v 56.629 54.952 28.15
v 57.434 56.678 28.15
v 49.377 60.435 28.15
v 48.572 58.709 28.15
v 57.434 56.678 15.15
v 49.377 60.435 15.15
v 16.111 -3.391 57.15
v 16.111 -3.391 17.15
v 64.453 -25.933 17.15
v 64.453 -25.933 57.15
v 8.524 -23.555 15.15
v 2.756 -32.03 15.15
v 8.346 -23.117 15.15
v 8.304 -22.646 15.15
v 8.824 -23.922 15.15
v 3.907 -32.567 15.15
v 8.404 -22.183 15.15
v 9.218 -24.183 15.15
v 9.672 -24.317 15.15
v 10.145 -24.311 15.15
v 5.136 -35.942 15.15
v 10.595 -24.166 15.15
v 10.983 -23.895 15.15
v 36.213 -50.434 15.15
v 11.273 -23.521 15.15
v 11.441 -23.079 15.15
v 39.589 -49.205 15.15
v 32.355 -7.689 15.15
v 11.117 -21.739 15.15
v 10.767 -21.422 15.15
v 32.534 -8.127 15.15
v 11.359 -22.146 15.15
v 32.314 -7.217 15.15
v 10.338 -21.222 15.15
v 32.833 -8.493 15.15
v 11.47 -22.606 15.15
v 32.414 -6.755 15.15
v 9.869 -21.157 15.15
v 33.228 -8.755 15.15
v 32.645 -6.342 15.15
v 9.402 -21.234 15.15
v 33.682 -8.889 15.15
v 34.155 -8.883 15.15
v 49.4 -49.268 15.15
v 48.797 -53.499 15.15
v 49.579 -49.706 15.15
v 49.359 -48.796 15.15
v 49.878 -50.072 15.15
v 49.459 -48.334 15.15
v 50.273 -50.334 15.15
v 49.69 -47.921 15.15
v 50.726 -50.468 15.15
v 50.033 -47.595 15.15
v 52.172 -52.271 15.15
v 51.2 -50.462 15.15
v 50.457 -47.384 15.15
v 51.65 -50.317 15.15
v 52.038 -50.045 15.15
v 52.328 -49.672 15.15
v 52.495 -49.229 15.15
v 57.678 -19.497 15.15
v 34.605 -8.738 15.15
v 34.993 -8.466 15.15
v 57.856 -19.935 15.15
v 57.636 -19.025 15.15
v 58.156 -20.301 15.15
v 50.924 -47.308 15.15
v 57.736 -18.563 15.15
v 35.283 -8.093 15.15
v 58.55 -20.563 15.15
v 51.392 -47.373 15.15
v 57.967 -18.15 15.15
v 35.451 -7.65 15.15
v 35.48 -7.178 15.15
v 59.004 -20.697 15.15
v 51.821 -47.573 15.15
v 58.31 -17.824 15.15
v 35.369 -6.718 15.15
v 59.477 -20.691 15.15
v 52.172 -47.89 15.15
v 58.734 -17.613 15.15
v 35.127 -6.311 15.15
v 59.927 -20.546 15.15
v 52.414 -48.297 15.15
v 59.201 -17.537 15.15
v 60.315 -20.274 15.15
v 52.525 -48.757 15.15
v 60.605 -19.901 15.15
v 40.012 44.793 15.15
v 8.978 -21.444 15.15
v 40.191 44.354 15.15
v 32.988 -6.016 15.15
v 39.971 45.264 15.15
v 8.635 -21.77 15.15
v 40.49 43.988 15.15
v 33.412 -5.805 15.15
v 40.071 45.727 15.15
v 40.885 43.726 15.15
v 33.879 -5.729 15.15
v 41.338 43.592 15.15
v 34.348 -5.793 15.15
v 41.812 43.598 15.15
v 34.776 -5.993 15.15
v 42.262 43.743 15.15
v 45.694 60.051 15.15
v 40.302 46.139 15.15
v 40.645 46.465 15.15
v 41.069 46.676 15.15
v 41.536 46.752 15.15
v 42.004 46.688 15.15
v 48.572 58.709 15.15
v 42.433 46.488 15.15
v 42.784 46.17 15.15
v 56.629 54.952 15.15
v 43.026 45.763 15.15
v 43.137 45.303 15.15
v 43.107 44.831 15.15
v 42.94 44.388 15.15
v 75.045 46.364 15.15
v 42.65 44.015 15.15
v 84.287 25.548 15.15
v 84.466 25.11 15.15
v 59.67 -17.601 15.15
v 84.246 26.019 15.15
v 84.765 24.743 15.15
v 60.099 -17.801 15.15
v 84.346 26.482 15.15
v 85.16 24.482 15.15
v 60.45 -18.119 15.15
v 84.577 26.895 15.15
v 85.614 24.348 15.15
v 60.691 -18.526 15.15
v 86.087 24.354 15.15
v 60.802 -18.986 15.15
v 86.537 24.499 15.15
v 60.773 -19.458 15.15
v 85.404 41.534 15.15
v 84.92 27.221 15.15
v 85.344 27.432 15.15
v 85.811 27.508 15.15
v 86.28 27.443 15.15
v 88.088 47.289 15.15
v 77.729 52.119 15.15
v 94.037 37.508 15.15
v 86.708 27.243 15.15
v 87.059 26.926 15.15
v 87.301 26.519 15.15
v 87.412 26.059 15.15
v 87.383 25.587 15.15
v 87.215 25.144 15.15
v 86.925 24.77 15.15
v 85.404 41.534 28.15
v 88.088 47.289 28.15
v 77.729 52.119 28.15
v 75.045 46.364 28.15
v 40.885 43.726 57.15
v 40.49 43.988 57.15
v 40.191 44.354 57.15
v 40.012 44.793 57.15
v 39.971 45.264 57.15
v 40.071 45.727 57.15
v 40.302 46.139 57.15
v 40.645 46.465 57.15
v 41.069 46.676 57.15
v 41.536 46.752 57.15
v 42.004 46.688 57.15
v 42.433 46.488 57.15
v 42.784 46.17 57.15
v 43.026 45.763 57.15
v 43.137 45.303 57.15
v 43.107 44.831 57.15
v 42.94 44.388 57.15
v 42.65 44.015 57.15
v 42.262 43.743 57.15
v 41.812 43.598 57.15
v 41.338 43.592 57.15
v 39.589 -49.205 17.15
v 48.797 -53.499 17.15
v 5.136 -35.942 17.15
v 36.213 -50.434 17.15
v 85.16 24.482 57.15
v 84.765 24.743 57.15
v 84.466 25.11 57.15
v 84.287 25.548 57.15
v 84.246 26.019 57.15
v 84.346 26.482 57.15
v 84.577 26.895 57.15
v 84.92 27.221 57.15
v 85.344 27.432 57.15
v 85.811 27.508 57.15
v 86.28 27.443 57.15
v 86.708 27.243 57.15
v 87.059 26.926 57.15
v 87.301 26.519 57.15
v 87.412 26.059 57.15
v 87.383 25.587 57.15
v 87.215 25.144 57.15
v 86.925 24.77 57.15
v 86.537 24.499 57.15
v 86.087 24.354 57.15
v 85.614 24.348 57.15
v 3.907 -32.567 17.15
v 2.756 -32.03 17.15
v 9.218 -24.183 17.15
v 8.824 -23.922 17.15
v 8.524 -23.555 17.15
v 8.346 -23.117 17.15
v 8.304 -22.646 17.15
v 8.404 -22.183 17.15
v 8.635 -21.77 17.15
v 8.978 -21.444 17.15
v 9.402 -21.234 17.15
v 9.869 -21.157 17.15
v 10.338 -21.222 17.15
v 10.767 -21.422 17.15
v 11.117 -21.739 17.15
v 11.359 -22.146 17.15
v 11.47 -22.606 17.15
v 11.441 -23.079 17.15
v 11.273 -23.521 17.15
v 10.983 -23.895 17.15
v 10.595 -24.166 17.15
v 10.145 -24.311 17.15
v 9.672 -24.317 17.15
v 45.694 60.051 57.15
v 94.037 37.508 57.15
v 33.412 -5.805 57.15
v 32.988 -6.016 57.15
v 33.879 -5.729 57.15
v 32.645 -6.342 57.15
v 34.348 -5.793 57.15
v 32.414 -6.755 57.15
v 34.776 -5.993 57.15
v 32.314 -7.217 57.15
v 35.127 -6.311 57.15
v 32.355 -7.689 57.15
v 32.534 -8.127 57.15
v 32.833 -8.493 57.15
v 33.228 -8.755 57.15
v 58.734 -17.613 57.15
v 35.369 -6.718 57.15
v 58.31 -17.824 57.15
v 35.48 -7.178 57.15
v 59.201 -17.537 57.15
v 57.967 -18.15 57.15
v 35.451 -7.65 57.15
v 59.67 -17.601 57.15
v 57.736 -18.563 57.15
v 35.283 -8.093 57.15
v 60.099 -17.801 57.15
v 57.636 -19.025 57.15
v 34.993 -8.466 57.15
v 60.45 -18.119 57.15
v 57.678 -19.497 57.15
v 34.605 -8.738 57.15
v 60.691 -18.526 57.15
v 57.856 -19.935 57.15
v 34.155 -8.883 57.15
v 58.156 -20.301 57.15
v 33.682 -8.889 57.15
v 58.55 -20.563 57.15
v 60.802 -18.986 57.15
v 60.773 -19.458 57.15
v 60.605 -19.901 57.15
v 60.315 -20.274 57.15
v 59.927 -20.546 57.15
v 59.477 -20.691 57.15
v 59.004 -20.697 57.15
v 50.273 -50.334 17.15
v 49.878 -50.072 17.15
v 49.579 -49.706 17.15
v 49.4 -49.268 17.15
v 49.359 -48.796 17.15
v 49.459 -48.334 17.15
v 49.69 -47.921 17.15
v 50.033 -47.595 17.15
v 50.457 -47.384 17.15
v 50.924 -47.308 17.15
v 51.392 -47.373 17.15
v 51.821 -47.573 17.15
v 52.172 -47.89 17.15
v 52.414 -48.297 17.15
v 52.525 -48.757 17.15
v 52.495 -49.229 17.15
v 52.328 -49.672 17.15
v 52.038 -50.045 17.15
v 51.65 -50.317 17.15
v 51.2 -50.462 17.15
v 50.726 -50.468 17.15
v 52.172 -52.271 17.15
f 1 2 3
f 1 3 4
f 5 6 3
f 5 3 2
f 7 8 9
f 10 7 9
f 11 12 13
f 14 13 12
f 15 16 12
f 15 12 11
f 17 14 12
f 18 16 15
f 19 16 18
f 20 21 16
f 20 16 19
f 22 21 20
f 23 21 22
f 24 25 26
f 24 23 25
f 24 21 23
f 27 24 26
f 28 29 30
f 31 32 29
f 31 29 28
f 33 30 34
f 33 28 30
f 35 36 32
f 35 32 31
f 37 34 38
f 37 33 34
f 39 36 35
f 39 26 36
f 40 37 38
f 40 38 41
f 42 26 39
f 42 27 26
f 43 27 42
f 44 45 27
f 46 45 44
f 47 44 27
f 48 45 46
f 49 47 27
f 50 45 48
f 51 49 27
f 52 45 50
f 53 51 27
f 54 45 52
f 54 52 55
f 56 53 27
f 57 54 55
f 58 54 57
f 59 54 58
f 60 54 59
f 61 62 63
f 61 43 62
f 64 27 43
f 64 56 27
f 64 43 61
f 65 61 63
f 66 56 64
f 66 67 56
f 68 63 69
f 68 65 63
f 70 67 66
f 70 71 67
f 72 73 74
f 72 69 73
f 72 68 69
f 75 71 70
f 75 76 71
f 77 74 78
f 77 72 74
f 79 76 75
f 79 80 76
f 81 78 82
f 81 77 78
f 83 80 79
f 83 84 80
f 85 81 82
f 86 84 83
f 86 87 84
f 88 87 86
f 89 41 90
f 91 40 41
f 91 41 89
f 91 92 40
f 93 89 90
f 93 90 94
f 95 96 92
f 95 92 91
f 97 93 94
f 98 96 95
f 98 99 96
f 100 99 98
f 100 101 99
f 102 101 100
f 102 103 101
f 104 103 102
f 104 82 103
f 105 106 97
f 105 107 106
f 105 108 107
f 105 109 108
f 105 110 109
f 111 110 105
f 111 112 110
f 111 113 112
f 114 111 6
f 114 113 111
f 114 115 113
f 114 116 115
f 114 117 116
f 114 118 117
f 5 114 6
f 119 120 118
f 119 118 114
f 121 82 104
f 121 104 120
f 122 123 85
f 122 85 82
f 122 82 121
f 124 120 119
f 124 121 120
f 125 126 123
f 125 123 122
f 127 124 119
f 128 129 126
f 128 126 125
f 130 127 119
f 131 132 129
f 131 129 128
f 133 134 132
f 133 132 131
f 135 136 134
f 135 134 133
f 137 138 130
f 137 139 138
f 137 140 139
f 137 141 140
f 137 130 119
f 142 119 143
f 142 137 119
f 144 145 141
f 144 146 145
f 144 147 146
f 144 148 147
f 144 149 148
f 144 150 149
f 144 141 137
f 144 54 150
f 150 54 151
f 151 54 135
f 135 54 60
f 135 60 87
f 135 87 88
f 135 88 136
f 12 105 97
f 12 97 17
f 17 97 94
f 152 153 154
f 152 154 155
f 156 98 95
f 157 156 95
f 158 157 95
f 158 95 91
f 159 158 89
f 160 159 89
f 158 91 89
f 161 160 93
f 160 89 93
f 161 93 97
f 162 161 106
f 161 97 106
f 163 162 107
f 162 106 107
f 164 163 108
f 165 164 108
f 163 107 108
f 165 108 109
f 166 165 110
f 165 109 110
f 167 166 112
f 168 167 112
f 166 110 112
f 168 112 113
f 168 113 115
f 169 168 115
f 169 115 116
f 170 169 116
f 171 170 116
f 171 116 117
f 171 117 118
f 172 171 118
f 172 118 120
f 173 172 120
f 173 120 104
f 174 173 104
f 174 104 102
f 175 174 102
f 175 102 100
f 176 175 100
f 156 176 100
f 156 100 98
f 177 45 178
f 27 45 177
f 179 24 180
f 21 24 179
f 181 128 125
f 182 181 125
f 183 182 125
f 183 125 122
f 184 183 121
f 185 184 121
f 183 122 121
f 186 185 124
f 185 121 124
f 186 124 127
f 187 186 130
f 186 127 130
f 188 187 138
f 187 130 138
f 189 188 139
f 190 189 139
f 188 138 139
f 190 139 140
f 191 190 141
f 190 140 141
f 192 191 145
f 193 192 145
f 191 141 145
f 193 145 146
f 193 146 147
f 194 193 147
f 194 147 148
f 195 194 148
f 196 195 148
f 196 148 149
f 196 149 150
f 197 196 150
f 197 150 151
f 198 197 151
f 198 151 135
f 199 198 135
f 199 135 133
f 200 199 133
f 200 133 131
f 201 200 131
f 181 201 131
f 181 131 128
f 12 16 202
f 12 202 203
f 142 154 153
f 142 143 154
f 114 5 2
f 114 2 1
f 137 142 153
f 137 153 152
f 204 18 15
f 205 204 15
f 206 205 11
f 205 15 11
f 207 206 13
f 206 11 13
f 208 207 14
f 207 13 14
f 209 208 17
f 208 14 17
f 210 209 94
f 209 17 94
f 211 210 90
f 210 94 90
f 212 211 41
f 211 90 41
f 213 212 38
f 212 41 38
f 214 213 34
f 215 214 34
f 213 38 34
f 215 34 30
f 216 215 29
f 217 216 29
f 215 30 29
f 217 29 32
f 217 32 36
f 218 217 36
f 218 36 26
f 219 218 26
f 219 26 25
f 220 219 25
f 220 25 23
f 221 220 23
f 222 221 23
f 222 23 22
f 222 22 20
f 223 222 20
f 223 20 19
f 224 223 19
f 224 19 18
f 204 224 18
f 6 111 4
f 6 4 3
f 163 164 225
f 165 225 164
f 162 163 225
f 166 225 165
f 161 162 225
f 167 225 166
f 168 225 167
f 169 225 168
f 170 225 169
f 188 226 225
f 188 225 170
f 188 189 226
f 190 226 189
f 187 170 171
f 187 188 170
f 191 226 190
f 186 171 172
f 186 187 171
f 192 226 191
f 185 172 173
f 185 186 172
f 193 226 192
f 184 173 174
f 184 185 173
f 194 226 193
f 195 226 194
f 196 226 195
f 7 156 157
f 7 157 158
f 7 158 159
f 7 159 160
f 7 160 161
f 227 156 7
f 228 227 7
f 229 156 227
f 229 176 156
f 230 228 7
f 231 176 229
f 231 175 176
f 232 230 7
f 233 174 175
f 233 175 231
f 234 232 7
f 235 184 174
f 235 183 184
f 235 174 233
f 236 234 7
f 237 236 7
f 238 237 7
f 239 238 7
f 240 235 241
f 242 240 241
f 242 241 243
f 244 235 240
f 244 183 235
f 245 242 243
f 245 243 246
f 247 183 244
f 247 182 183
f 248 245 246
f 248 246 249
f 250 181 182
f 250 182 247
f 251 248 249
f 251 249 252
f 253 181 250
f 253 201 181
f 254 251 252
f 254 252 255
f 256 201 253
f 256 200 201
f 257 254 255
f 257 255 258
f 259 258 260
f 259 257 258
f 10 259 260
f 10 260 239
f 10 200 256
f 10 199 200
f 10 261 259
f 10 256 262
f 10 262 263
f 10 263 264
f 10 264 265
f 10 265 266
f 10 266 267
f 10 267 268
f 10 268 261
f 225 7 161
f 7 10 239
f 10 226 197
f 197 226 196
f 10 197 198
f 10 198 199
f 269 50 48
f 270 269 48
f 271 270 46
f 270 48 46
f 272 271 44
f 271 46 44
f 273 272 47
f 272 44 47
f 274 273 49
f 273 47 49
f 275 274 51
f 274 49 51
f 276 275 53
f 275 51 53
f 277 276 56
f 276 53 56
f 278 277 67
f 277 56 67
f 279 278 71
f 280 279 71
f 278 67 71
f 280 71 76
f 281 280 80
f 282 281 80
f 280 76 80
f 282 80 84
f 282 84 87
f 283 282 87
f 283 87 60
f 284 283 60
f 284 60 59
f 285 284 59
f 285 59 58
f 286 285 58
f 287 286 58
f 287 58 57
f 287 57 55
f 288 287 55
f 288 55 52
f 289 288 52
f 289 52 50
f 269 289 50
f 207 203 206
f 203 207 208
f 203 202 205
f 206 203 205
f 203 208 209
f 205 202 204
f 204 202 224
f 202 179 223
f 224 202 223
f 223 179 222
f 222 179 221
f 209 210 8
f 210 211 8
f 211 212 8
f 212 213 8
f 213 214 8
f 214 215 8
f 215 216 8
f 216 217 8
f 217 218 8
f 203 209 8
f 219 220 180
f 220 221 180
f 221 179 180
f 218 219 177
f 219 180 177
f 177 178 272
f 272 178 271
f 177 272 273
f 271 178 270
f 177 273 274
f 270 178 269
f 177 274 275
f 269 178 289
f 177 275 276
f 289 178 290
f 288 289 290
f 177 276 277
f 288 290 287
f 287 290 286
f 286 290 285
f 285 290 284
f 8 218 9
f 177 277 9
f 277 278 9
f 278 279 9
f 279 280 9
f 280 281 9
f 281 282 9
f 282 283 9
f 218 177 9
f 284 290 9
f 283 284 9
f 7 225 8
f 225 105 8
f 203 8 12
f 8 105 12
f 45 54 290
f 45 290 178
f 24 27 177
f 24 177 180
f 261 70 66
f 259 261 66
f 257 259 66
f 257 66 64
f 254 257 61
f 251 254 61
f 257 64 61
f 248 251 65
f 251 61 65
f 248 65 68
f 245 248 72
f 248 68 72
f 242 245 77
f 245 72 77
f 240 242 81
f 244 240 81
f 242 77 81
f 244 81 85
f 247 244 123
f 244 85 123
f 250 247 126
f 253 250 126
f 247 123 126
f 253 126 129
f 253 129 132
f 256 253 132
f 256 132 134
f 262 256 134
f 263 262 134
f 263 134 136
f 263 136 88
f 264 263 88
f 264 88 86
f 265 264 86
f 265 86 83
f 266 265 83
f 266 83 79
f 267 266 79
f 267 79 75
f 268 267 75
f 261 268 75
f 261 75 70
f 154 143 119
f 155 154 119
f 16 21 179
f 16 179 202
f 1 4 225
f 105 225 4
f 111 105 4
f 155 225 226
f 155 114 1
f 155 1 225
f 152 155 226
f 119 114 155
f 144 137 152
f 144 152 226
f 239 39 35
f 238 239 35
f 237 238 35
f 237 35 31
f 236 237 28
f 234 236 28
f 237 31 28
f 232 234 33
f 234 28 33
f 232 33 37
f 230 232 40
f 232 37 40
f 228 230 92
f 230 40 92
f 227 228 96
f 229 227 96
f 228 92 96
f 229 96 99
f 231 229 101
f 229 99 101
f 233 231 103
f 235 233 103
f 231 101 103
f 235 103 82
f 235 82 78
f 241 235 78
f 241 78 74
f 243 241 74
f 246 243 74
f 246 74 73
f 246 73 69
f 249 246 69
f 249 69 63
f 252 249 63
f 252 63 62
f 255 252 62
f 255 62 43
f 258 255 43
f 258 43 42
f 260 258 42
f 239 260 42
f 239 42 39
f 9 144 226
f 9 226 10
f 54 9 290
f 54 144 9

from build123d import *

# Parameters (mm, degrees)
PAD017_DEPTH            = 2
SKETCH057_W             = 70
SKETCH057_H             = 53.34
PAD018_DEPTH            = 40
SKETCH058_W             = 17
SKETCH058_H             = 11.43
SKETCH058_W_2           = 13
SKETCH058_H_2           = 8.89
PAD019_DEPTH            = 11
SKETCH059_R             = 1.5875
POCKET_DEPTH            = 50
BODY012_PLACEMENT_ANGLE = 115


with BuildPart() as part:
    # Sketch056 → Pad017 (new body)
    with BuildSketch(Plane.XY):
        Polygon((-101.6, 53.34), (-2.54, 53.34), (0, 50.8), (0, 40.64), (2.54, 38.1), (2.54, 3.81), (0, 1.27), (0, 0), (-101.6, 0), (-101.6, 3.175), (-103.505, 3.175), (-103.505, 12.065), (-101.6, 12.065), (-101.6, 32.385), (-107.95, 32.385), (-107.95, 43.815), (-101.6, 43.815), align=None)
    extrude(amount=PAD017_DEPTH)

    # Sketch057 (on Face19 of Pad017) → Pad018 (join)
    with BuildSketch(Plane.XY.offset(2)):
        with Locations((-66.6, 26.67)):
            Rectangle(SKETCH057_W, SKETCH057_H)
    extrude(amount=PAD018_DEPTH)

    # Sketch058 (on Face24 of Pad018) → Pad019 (join)
    with BuildSketch(Plane.XY.offset(2)):
        with Locations((-99.45, 38.1)):
            Rectangle(SKETCH058_W, SKETCH058_H)
        with Locations((-97.005, 7.62)):
            Rectangle(SKETCH058_W_2, SKETCH058_H_2)
    extrude(amount=PAD019_DEPTH)

    # Sketch059 (on Face4 of Pad019) → Pocket (cut)
    with BuildSketch(Plane(origin=(0, 0, 0), x_dir=(1, 0, 0), z_dir=(0, 0, -1))):
        with Locations((-86.36, -2.54)):
            Circle(SKETCH059_R)
        with Locations((-11.43, -2.54)):
            Circle(SKETCH059_R)
        with Locations((-87.63, -50.8)):
            Circle(SKETCH059_R)
        with Locations((-5.08, -50.8)):
            Circle(SKETCH059_R)
        with Locations((-35.56, -17.78)):
            Circle(SKETCH059_R)
        with Locations((-35.56, -45.72)):
            Circle(SKETCH059_R)
    extrude(amount=-POCKET_DEPTH, mode=Mode.SUBTRACT)


with BuildPart() as part_1:
    # Body012 placement: moved
    add(part.part.moved(Location((2.7561582663, -32.0302512871, 15.15))).rotate(Axis((2.7561582663, -32.0302512871, 15.15), (0, 0, -1)), BODY012_PLACEMENT_ANGLE))


solid = part_1.part
